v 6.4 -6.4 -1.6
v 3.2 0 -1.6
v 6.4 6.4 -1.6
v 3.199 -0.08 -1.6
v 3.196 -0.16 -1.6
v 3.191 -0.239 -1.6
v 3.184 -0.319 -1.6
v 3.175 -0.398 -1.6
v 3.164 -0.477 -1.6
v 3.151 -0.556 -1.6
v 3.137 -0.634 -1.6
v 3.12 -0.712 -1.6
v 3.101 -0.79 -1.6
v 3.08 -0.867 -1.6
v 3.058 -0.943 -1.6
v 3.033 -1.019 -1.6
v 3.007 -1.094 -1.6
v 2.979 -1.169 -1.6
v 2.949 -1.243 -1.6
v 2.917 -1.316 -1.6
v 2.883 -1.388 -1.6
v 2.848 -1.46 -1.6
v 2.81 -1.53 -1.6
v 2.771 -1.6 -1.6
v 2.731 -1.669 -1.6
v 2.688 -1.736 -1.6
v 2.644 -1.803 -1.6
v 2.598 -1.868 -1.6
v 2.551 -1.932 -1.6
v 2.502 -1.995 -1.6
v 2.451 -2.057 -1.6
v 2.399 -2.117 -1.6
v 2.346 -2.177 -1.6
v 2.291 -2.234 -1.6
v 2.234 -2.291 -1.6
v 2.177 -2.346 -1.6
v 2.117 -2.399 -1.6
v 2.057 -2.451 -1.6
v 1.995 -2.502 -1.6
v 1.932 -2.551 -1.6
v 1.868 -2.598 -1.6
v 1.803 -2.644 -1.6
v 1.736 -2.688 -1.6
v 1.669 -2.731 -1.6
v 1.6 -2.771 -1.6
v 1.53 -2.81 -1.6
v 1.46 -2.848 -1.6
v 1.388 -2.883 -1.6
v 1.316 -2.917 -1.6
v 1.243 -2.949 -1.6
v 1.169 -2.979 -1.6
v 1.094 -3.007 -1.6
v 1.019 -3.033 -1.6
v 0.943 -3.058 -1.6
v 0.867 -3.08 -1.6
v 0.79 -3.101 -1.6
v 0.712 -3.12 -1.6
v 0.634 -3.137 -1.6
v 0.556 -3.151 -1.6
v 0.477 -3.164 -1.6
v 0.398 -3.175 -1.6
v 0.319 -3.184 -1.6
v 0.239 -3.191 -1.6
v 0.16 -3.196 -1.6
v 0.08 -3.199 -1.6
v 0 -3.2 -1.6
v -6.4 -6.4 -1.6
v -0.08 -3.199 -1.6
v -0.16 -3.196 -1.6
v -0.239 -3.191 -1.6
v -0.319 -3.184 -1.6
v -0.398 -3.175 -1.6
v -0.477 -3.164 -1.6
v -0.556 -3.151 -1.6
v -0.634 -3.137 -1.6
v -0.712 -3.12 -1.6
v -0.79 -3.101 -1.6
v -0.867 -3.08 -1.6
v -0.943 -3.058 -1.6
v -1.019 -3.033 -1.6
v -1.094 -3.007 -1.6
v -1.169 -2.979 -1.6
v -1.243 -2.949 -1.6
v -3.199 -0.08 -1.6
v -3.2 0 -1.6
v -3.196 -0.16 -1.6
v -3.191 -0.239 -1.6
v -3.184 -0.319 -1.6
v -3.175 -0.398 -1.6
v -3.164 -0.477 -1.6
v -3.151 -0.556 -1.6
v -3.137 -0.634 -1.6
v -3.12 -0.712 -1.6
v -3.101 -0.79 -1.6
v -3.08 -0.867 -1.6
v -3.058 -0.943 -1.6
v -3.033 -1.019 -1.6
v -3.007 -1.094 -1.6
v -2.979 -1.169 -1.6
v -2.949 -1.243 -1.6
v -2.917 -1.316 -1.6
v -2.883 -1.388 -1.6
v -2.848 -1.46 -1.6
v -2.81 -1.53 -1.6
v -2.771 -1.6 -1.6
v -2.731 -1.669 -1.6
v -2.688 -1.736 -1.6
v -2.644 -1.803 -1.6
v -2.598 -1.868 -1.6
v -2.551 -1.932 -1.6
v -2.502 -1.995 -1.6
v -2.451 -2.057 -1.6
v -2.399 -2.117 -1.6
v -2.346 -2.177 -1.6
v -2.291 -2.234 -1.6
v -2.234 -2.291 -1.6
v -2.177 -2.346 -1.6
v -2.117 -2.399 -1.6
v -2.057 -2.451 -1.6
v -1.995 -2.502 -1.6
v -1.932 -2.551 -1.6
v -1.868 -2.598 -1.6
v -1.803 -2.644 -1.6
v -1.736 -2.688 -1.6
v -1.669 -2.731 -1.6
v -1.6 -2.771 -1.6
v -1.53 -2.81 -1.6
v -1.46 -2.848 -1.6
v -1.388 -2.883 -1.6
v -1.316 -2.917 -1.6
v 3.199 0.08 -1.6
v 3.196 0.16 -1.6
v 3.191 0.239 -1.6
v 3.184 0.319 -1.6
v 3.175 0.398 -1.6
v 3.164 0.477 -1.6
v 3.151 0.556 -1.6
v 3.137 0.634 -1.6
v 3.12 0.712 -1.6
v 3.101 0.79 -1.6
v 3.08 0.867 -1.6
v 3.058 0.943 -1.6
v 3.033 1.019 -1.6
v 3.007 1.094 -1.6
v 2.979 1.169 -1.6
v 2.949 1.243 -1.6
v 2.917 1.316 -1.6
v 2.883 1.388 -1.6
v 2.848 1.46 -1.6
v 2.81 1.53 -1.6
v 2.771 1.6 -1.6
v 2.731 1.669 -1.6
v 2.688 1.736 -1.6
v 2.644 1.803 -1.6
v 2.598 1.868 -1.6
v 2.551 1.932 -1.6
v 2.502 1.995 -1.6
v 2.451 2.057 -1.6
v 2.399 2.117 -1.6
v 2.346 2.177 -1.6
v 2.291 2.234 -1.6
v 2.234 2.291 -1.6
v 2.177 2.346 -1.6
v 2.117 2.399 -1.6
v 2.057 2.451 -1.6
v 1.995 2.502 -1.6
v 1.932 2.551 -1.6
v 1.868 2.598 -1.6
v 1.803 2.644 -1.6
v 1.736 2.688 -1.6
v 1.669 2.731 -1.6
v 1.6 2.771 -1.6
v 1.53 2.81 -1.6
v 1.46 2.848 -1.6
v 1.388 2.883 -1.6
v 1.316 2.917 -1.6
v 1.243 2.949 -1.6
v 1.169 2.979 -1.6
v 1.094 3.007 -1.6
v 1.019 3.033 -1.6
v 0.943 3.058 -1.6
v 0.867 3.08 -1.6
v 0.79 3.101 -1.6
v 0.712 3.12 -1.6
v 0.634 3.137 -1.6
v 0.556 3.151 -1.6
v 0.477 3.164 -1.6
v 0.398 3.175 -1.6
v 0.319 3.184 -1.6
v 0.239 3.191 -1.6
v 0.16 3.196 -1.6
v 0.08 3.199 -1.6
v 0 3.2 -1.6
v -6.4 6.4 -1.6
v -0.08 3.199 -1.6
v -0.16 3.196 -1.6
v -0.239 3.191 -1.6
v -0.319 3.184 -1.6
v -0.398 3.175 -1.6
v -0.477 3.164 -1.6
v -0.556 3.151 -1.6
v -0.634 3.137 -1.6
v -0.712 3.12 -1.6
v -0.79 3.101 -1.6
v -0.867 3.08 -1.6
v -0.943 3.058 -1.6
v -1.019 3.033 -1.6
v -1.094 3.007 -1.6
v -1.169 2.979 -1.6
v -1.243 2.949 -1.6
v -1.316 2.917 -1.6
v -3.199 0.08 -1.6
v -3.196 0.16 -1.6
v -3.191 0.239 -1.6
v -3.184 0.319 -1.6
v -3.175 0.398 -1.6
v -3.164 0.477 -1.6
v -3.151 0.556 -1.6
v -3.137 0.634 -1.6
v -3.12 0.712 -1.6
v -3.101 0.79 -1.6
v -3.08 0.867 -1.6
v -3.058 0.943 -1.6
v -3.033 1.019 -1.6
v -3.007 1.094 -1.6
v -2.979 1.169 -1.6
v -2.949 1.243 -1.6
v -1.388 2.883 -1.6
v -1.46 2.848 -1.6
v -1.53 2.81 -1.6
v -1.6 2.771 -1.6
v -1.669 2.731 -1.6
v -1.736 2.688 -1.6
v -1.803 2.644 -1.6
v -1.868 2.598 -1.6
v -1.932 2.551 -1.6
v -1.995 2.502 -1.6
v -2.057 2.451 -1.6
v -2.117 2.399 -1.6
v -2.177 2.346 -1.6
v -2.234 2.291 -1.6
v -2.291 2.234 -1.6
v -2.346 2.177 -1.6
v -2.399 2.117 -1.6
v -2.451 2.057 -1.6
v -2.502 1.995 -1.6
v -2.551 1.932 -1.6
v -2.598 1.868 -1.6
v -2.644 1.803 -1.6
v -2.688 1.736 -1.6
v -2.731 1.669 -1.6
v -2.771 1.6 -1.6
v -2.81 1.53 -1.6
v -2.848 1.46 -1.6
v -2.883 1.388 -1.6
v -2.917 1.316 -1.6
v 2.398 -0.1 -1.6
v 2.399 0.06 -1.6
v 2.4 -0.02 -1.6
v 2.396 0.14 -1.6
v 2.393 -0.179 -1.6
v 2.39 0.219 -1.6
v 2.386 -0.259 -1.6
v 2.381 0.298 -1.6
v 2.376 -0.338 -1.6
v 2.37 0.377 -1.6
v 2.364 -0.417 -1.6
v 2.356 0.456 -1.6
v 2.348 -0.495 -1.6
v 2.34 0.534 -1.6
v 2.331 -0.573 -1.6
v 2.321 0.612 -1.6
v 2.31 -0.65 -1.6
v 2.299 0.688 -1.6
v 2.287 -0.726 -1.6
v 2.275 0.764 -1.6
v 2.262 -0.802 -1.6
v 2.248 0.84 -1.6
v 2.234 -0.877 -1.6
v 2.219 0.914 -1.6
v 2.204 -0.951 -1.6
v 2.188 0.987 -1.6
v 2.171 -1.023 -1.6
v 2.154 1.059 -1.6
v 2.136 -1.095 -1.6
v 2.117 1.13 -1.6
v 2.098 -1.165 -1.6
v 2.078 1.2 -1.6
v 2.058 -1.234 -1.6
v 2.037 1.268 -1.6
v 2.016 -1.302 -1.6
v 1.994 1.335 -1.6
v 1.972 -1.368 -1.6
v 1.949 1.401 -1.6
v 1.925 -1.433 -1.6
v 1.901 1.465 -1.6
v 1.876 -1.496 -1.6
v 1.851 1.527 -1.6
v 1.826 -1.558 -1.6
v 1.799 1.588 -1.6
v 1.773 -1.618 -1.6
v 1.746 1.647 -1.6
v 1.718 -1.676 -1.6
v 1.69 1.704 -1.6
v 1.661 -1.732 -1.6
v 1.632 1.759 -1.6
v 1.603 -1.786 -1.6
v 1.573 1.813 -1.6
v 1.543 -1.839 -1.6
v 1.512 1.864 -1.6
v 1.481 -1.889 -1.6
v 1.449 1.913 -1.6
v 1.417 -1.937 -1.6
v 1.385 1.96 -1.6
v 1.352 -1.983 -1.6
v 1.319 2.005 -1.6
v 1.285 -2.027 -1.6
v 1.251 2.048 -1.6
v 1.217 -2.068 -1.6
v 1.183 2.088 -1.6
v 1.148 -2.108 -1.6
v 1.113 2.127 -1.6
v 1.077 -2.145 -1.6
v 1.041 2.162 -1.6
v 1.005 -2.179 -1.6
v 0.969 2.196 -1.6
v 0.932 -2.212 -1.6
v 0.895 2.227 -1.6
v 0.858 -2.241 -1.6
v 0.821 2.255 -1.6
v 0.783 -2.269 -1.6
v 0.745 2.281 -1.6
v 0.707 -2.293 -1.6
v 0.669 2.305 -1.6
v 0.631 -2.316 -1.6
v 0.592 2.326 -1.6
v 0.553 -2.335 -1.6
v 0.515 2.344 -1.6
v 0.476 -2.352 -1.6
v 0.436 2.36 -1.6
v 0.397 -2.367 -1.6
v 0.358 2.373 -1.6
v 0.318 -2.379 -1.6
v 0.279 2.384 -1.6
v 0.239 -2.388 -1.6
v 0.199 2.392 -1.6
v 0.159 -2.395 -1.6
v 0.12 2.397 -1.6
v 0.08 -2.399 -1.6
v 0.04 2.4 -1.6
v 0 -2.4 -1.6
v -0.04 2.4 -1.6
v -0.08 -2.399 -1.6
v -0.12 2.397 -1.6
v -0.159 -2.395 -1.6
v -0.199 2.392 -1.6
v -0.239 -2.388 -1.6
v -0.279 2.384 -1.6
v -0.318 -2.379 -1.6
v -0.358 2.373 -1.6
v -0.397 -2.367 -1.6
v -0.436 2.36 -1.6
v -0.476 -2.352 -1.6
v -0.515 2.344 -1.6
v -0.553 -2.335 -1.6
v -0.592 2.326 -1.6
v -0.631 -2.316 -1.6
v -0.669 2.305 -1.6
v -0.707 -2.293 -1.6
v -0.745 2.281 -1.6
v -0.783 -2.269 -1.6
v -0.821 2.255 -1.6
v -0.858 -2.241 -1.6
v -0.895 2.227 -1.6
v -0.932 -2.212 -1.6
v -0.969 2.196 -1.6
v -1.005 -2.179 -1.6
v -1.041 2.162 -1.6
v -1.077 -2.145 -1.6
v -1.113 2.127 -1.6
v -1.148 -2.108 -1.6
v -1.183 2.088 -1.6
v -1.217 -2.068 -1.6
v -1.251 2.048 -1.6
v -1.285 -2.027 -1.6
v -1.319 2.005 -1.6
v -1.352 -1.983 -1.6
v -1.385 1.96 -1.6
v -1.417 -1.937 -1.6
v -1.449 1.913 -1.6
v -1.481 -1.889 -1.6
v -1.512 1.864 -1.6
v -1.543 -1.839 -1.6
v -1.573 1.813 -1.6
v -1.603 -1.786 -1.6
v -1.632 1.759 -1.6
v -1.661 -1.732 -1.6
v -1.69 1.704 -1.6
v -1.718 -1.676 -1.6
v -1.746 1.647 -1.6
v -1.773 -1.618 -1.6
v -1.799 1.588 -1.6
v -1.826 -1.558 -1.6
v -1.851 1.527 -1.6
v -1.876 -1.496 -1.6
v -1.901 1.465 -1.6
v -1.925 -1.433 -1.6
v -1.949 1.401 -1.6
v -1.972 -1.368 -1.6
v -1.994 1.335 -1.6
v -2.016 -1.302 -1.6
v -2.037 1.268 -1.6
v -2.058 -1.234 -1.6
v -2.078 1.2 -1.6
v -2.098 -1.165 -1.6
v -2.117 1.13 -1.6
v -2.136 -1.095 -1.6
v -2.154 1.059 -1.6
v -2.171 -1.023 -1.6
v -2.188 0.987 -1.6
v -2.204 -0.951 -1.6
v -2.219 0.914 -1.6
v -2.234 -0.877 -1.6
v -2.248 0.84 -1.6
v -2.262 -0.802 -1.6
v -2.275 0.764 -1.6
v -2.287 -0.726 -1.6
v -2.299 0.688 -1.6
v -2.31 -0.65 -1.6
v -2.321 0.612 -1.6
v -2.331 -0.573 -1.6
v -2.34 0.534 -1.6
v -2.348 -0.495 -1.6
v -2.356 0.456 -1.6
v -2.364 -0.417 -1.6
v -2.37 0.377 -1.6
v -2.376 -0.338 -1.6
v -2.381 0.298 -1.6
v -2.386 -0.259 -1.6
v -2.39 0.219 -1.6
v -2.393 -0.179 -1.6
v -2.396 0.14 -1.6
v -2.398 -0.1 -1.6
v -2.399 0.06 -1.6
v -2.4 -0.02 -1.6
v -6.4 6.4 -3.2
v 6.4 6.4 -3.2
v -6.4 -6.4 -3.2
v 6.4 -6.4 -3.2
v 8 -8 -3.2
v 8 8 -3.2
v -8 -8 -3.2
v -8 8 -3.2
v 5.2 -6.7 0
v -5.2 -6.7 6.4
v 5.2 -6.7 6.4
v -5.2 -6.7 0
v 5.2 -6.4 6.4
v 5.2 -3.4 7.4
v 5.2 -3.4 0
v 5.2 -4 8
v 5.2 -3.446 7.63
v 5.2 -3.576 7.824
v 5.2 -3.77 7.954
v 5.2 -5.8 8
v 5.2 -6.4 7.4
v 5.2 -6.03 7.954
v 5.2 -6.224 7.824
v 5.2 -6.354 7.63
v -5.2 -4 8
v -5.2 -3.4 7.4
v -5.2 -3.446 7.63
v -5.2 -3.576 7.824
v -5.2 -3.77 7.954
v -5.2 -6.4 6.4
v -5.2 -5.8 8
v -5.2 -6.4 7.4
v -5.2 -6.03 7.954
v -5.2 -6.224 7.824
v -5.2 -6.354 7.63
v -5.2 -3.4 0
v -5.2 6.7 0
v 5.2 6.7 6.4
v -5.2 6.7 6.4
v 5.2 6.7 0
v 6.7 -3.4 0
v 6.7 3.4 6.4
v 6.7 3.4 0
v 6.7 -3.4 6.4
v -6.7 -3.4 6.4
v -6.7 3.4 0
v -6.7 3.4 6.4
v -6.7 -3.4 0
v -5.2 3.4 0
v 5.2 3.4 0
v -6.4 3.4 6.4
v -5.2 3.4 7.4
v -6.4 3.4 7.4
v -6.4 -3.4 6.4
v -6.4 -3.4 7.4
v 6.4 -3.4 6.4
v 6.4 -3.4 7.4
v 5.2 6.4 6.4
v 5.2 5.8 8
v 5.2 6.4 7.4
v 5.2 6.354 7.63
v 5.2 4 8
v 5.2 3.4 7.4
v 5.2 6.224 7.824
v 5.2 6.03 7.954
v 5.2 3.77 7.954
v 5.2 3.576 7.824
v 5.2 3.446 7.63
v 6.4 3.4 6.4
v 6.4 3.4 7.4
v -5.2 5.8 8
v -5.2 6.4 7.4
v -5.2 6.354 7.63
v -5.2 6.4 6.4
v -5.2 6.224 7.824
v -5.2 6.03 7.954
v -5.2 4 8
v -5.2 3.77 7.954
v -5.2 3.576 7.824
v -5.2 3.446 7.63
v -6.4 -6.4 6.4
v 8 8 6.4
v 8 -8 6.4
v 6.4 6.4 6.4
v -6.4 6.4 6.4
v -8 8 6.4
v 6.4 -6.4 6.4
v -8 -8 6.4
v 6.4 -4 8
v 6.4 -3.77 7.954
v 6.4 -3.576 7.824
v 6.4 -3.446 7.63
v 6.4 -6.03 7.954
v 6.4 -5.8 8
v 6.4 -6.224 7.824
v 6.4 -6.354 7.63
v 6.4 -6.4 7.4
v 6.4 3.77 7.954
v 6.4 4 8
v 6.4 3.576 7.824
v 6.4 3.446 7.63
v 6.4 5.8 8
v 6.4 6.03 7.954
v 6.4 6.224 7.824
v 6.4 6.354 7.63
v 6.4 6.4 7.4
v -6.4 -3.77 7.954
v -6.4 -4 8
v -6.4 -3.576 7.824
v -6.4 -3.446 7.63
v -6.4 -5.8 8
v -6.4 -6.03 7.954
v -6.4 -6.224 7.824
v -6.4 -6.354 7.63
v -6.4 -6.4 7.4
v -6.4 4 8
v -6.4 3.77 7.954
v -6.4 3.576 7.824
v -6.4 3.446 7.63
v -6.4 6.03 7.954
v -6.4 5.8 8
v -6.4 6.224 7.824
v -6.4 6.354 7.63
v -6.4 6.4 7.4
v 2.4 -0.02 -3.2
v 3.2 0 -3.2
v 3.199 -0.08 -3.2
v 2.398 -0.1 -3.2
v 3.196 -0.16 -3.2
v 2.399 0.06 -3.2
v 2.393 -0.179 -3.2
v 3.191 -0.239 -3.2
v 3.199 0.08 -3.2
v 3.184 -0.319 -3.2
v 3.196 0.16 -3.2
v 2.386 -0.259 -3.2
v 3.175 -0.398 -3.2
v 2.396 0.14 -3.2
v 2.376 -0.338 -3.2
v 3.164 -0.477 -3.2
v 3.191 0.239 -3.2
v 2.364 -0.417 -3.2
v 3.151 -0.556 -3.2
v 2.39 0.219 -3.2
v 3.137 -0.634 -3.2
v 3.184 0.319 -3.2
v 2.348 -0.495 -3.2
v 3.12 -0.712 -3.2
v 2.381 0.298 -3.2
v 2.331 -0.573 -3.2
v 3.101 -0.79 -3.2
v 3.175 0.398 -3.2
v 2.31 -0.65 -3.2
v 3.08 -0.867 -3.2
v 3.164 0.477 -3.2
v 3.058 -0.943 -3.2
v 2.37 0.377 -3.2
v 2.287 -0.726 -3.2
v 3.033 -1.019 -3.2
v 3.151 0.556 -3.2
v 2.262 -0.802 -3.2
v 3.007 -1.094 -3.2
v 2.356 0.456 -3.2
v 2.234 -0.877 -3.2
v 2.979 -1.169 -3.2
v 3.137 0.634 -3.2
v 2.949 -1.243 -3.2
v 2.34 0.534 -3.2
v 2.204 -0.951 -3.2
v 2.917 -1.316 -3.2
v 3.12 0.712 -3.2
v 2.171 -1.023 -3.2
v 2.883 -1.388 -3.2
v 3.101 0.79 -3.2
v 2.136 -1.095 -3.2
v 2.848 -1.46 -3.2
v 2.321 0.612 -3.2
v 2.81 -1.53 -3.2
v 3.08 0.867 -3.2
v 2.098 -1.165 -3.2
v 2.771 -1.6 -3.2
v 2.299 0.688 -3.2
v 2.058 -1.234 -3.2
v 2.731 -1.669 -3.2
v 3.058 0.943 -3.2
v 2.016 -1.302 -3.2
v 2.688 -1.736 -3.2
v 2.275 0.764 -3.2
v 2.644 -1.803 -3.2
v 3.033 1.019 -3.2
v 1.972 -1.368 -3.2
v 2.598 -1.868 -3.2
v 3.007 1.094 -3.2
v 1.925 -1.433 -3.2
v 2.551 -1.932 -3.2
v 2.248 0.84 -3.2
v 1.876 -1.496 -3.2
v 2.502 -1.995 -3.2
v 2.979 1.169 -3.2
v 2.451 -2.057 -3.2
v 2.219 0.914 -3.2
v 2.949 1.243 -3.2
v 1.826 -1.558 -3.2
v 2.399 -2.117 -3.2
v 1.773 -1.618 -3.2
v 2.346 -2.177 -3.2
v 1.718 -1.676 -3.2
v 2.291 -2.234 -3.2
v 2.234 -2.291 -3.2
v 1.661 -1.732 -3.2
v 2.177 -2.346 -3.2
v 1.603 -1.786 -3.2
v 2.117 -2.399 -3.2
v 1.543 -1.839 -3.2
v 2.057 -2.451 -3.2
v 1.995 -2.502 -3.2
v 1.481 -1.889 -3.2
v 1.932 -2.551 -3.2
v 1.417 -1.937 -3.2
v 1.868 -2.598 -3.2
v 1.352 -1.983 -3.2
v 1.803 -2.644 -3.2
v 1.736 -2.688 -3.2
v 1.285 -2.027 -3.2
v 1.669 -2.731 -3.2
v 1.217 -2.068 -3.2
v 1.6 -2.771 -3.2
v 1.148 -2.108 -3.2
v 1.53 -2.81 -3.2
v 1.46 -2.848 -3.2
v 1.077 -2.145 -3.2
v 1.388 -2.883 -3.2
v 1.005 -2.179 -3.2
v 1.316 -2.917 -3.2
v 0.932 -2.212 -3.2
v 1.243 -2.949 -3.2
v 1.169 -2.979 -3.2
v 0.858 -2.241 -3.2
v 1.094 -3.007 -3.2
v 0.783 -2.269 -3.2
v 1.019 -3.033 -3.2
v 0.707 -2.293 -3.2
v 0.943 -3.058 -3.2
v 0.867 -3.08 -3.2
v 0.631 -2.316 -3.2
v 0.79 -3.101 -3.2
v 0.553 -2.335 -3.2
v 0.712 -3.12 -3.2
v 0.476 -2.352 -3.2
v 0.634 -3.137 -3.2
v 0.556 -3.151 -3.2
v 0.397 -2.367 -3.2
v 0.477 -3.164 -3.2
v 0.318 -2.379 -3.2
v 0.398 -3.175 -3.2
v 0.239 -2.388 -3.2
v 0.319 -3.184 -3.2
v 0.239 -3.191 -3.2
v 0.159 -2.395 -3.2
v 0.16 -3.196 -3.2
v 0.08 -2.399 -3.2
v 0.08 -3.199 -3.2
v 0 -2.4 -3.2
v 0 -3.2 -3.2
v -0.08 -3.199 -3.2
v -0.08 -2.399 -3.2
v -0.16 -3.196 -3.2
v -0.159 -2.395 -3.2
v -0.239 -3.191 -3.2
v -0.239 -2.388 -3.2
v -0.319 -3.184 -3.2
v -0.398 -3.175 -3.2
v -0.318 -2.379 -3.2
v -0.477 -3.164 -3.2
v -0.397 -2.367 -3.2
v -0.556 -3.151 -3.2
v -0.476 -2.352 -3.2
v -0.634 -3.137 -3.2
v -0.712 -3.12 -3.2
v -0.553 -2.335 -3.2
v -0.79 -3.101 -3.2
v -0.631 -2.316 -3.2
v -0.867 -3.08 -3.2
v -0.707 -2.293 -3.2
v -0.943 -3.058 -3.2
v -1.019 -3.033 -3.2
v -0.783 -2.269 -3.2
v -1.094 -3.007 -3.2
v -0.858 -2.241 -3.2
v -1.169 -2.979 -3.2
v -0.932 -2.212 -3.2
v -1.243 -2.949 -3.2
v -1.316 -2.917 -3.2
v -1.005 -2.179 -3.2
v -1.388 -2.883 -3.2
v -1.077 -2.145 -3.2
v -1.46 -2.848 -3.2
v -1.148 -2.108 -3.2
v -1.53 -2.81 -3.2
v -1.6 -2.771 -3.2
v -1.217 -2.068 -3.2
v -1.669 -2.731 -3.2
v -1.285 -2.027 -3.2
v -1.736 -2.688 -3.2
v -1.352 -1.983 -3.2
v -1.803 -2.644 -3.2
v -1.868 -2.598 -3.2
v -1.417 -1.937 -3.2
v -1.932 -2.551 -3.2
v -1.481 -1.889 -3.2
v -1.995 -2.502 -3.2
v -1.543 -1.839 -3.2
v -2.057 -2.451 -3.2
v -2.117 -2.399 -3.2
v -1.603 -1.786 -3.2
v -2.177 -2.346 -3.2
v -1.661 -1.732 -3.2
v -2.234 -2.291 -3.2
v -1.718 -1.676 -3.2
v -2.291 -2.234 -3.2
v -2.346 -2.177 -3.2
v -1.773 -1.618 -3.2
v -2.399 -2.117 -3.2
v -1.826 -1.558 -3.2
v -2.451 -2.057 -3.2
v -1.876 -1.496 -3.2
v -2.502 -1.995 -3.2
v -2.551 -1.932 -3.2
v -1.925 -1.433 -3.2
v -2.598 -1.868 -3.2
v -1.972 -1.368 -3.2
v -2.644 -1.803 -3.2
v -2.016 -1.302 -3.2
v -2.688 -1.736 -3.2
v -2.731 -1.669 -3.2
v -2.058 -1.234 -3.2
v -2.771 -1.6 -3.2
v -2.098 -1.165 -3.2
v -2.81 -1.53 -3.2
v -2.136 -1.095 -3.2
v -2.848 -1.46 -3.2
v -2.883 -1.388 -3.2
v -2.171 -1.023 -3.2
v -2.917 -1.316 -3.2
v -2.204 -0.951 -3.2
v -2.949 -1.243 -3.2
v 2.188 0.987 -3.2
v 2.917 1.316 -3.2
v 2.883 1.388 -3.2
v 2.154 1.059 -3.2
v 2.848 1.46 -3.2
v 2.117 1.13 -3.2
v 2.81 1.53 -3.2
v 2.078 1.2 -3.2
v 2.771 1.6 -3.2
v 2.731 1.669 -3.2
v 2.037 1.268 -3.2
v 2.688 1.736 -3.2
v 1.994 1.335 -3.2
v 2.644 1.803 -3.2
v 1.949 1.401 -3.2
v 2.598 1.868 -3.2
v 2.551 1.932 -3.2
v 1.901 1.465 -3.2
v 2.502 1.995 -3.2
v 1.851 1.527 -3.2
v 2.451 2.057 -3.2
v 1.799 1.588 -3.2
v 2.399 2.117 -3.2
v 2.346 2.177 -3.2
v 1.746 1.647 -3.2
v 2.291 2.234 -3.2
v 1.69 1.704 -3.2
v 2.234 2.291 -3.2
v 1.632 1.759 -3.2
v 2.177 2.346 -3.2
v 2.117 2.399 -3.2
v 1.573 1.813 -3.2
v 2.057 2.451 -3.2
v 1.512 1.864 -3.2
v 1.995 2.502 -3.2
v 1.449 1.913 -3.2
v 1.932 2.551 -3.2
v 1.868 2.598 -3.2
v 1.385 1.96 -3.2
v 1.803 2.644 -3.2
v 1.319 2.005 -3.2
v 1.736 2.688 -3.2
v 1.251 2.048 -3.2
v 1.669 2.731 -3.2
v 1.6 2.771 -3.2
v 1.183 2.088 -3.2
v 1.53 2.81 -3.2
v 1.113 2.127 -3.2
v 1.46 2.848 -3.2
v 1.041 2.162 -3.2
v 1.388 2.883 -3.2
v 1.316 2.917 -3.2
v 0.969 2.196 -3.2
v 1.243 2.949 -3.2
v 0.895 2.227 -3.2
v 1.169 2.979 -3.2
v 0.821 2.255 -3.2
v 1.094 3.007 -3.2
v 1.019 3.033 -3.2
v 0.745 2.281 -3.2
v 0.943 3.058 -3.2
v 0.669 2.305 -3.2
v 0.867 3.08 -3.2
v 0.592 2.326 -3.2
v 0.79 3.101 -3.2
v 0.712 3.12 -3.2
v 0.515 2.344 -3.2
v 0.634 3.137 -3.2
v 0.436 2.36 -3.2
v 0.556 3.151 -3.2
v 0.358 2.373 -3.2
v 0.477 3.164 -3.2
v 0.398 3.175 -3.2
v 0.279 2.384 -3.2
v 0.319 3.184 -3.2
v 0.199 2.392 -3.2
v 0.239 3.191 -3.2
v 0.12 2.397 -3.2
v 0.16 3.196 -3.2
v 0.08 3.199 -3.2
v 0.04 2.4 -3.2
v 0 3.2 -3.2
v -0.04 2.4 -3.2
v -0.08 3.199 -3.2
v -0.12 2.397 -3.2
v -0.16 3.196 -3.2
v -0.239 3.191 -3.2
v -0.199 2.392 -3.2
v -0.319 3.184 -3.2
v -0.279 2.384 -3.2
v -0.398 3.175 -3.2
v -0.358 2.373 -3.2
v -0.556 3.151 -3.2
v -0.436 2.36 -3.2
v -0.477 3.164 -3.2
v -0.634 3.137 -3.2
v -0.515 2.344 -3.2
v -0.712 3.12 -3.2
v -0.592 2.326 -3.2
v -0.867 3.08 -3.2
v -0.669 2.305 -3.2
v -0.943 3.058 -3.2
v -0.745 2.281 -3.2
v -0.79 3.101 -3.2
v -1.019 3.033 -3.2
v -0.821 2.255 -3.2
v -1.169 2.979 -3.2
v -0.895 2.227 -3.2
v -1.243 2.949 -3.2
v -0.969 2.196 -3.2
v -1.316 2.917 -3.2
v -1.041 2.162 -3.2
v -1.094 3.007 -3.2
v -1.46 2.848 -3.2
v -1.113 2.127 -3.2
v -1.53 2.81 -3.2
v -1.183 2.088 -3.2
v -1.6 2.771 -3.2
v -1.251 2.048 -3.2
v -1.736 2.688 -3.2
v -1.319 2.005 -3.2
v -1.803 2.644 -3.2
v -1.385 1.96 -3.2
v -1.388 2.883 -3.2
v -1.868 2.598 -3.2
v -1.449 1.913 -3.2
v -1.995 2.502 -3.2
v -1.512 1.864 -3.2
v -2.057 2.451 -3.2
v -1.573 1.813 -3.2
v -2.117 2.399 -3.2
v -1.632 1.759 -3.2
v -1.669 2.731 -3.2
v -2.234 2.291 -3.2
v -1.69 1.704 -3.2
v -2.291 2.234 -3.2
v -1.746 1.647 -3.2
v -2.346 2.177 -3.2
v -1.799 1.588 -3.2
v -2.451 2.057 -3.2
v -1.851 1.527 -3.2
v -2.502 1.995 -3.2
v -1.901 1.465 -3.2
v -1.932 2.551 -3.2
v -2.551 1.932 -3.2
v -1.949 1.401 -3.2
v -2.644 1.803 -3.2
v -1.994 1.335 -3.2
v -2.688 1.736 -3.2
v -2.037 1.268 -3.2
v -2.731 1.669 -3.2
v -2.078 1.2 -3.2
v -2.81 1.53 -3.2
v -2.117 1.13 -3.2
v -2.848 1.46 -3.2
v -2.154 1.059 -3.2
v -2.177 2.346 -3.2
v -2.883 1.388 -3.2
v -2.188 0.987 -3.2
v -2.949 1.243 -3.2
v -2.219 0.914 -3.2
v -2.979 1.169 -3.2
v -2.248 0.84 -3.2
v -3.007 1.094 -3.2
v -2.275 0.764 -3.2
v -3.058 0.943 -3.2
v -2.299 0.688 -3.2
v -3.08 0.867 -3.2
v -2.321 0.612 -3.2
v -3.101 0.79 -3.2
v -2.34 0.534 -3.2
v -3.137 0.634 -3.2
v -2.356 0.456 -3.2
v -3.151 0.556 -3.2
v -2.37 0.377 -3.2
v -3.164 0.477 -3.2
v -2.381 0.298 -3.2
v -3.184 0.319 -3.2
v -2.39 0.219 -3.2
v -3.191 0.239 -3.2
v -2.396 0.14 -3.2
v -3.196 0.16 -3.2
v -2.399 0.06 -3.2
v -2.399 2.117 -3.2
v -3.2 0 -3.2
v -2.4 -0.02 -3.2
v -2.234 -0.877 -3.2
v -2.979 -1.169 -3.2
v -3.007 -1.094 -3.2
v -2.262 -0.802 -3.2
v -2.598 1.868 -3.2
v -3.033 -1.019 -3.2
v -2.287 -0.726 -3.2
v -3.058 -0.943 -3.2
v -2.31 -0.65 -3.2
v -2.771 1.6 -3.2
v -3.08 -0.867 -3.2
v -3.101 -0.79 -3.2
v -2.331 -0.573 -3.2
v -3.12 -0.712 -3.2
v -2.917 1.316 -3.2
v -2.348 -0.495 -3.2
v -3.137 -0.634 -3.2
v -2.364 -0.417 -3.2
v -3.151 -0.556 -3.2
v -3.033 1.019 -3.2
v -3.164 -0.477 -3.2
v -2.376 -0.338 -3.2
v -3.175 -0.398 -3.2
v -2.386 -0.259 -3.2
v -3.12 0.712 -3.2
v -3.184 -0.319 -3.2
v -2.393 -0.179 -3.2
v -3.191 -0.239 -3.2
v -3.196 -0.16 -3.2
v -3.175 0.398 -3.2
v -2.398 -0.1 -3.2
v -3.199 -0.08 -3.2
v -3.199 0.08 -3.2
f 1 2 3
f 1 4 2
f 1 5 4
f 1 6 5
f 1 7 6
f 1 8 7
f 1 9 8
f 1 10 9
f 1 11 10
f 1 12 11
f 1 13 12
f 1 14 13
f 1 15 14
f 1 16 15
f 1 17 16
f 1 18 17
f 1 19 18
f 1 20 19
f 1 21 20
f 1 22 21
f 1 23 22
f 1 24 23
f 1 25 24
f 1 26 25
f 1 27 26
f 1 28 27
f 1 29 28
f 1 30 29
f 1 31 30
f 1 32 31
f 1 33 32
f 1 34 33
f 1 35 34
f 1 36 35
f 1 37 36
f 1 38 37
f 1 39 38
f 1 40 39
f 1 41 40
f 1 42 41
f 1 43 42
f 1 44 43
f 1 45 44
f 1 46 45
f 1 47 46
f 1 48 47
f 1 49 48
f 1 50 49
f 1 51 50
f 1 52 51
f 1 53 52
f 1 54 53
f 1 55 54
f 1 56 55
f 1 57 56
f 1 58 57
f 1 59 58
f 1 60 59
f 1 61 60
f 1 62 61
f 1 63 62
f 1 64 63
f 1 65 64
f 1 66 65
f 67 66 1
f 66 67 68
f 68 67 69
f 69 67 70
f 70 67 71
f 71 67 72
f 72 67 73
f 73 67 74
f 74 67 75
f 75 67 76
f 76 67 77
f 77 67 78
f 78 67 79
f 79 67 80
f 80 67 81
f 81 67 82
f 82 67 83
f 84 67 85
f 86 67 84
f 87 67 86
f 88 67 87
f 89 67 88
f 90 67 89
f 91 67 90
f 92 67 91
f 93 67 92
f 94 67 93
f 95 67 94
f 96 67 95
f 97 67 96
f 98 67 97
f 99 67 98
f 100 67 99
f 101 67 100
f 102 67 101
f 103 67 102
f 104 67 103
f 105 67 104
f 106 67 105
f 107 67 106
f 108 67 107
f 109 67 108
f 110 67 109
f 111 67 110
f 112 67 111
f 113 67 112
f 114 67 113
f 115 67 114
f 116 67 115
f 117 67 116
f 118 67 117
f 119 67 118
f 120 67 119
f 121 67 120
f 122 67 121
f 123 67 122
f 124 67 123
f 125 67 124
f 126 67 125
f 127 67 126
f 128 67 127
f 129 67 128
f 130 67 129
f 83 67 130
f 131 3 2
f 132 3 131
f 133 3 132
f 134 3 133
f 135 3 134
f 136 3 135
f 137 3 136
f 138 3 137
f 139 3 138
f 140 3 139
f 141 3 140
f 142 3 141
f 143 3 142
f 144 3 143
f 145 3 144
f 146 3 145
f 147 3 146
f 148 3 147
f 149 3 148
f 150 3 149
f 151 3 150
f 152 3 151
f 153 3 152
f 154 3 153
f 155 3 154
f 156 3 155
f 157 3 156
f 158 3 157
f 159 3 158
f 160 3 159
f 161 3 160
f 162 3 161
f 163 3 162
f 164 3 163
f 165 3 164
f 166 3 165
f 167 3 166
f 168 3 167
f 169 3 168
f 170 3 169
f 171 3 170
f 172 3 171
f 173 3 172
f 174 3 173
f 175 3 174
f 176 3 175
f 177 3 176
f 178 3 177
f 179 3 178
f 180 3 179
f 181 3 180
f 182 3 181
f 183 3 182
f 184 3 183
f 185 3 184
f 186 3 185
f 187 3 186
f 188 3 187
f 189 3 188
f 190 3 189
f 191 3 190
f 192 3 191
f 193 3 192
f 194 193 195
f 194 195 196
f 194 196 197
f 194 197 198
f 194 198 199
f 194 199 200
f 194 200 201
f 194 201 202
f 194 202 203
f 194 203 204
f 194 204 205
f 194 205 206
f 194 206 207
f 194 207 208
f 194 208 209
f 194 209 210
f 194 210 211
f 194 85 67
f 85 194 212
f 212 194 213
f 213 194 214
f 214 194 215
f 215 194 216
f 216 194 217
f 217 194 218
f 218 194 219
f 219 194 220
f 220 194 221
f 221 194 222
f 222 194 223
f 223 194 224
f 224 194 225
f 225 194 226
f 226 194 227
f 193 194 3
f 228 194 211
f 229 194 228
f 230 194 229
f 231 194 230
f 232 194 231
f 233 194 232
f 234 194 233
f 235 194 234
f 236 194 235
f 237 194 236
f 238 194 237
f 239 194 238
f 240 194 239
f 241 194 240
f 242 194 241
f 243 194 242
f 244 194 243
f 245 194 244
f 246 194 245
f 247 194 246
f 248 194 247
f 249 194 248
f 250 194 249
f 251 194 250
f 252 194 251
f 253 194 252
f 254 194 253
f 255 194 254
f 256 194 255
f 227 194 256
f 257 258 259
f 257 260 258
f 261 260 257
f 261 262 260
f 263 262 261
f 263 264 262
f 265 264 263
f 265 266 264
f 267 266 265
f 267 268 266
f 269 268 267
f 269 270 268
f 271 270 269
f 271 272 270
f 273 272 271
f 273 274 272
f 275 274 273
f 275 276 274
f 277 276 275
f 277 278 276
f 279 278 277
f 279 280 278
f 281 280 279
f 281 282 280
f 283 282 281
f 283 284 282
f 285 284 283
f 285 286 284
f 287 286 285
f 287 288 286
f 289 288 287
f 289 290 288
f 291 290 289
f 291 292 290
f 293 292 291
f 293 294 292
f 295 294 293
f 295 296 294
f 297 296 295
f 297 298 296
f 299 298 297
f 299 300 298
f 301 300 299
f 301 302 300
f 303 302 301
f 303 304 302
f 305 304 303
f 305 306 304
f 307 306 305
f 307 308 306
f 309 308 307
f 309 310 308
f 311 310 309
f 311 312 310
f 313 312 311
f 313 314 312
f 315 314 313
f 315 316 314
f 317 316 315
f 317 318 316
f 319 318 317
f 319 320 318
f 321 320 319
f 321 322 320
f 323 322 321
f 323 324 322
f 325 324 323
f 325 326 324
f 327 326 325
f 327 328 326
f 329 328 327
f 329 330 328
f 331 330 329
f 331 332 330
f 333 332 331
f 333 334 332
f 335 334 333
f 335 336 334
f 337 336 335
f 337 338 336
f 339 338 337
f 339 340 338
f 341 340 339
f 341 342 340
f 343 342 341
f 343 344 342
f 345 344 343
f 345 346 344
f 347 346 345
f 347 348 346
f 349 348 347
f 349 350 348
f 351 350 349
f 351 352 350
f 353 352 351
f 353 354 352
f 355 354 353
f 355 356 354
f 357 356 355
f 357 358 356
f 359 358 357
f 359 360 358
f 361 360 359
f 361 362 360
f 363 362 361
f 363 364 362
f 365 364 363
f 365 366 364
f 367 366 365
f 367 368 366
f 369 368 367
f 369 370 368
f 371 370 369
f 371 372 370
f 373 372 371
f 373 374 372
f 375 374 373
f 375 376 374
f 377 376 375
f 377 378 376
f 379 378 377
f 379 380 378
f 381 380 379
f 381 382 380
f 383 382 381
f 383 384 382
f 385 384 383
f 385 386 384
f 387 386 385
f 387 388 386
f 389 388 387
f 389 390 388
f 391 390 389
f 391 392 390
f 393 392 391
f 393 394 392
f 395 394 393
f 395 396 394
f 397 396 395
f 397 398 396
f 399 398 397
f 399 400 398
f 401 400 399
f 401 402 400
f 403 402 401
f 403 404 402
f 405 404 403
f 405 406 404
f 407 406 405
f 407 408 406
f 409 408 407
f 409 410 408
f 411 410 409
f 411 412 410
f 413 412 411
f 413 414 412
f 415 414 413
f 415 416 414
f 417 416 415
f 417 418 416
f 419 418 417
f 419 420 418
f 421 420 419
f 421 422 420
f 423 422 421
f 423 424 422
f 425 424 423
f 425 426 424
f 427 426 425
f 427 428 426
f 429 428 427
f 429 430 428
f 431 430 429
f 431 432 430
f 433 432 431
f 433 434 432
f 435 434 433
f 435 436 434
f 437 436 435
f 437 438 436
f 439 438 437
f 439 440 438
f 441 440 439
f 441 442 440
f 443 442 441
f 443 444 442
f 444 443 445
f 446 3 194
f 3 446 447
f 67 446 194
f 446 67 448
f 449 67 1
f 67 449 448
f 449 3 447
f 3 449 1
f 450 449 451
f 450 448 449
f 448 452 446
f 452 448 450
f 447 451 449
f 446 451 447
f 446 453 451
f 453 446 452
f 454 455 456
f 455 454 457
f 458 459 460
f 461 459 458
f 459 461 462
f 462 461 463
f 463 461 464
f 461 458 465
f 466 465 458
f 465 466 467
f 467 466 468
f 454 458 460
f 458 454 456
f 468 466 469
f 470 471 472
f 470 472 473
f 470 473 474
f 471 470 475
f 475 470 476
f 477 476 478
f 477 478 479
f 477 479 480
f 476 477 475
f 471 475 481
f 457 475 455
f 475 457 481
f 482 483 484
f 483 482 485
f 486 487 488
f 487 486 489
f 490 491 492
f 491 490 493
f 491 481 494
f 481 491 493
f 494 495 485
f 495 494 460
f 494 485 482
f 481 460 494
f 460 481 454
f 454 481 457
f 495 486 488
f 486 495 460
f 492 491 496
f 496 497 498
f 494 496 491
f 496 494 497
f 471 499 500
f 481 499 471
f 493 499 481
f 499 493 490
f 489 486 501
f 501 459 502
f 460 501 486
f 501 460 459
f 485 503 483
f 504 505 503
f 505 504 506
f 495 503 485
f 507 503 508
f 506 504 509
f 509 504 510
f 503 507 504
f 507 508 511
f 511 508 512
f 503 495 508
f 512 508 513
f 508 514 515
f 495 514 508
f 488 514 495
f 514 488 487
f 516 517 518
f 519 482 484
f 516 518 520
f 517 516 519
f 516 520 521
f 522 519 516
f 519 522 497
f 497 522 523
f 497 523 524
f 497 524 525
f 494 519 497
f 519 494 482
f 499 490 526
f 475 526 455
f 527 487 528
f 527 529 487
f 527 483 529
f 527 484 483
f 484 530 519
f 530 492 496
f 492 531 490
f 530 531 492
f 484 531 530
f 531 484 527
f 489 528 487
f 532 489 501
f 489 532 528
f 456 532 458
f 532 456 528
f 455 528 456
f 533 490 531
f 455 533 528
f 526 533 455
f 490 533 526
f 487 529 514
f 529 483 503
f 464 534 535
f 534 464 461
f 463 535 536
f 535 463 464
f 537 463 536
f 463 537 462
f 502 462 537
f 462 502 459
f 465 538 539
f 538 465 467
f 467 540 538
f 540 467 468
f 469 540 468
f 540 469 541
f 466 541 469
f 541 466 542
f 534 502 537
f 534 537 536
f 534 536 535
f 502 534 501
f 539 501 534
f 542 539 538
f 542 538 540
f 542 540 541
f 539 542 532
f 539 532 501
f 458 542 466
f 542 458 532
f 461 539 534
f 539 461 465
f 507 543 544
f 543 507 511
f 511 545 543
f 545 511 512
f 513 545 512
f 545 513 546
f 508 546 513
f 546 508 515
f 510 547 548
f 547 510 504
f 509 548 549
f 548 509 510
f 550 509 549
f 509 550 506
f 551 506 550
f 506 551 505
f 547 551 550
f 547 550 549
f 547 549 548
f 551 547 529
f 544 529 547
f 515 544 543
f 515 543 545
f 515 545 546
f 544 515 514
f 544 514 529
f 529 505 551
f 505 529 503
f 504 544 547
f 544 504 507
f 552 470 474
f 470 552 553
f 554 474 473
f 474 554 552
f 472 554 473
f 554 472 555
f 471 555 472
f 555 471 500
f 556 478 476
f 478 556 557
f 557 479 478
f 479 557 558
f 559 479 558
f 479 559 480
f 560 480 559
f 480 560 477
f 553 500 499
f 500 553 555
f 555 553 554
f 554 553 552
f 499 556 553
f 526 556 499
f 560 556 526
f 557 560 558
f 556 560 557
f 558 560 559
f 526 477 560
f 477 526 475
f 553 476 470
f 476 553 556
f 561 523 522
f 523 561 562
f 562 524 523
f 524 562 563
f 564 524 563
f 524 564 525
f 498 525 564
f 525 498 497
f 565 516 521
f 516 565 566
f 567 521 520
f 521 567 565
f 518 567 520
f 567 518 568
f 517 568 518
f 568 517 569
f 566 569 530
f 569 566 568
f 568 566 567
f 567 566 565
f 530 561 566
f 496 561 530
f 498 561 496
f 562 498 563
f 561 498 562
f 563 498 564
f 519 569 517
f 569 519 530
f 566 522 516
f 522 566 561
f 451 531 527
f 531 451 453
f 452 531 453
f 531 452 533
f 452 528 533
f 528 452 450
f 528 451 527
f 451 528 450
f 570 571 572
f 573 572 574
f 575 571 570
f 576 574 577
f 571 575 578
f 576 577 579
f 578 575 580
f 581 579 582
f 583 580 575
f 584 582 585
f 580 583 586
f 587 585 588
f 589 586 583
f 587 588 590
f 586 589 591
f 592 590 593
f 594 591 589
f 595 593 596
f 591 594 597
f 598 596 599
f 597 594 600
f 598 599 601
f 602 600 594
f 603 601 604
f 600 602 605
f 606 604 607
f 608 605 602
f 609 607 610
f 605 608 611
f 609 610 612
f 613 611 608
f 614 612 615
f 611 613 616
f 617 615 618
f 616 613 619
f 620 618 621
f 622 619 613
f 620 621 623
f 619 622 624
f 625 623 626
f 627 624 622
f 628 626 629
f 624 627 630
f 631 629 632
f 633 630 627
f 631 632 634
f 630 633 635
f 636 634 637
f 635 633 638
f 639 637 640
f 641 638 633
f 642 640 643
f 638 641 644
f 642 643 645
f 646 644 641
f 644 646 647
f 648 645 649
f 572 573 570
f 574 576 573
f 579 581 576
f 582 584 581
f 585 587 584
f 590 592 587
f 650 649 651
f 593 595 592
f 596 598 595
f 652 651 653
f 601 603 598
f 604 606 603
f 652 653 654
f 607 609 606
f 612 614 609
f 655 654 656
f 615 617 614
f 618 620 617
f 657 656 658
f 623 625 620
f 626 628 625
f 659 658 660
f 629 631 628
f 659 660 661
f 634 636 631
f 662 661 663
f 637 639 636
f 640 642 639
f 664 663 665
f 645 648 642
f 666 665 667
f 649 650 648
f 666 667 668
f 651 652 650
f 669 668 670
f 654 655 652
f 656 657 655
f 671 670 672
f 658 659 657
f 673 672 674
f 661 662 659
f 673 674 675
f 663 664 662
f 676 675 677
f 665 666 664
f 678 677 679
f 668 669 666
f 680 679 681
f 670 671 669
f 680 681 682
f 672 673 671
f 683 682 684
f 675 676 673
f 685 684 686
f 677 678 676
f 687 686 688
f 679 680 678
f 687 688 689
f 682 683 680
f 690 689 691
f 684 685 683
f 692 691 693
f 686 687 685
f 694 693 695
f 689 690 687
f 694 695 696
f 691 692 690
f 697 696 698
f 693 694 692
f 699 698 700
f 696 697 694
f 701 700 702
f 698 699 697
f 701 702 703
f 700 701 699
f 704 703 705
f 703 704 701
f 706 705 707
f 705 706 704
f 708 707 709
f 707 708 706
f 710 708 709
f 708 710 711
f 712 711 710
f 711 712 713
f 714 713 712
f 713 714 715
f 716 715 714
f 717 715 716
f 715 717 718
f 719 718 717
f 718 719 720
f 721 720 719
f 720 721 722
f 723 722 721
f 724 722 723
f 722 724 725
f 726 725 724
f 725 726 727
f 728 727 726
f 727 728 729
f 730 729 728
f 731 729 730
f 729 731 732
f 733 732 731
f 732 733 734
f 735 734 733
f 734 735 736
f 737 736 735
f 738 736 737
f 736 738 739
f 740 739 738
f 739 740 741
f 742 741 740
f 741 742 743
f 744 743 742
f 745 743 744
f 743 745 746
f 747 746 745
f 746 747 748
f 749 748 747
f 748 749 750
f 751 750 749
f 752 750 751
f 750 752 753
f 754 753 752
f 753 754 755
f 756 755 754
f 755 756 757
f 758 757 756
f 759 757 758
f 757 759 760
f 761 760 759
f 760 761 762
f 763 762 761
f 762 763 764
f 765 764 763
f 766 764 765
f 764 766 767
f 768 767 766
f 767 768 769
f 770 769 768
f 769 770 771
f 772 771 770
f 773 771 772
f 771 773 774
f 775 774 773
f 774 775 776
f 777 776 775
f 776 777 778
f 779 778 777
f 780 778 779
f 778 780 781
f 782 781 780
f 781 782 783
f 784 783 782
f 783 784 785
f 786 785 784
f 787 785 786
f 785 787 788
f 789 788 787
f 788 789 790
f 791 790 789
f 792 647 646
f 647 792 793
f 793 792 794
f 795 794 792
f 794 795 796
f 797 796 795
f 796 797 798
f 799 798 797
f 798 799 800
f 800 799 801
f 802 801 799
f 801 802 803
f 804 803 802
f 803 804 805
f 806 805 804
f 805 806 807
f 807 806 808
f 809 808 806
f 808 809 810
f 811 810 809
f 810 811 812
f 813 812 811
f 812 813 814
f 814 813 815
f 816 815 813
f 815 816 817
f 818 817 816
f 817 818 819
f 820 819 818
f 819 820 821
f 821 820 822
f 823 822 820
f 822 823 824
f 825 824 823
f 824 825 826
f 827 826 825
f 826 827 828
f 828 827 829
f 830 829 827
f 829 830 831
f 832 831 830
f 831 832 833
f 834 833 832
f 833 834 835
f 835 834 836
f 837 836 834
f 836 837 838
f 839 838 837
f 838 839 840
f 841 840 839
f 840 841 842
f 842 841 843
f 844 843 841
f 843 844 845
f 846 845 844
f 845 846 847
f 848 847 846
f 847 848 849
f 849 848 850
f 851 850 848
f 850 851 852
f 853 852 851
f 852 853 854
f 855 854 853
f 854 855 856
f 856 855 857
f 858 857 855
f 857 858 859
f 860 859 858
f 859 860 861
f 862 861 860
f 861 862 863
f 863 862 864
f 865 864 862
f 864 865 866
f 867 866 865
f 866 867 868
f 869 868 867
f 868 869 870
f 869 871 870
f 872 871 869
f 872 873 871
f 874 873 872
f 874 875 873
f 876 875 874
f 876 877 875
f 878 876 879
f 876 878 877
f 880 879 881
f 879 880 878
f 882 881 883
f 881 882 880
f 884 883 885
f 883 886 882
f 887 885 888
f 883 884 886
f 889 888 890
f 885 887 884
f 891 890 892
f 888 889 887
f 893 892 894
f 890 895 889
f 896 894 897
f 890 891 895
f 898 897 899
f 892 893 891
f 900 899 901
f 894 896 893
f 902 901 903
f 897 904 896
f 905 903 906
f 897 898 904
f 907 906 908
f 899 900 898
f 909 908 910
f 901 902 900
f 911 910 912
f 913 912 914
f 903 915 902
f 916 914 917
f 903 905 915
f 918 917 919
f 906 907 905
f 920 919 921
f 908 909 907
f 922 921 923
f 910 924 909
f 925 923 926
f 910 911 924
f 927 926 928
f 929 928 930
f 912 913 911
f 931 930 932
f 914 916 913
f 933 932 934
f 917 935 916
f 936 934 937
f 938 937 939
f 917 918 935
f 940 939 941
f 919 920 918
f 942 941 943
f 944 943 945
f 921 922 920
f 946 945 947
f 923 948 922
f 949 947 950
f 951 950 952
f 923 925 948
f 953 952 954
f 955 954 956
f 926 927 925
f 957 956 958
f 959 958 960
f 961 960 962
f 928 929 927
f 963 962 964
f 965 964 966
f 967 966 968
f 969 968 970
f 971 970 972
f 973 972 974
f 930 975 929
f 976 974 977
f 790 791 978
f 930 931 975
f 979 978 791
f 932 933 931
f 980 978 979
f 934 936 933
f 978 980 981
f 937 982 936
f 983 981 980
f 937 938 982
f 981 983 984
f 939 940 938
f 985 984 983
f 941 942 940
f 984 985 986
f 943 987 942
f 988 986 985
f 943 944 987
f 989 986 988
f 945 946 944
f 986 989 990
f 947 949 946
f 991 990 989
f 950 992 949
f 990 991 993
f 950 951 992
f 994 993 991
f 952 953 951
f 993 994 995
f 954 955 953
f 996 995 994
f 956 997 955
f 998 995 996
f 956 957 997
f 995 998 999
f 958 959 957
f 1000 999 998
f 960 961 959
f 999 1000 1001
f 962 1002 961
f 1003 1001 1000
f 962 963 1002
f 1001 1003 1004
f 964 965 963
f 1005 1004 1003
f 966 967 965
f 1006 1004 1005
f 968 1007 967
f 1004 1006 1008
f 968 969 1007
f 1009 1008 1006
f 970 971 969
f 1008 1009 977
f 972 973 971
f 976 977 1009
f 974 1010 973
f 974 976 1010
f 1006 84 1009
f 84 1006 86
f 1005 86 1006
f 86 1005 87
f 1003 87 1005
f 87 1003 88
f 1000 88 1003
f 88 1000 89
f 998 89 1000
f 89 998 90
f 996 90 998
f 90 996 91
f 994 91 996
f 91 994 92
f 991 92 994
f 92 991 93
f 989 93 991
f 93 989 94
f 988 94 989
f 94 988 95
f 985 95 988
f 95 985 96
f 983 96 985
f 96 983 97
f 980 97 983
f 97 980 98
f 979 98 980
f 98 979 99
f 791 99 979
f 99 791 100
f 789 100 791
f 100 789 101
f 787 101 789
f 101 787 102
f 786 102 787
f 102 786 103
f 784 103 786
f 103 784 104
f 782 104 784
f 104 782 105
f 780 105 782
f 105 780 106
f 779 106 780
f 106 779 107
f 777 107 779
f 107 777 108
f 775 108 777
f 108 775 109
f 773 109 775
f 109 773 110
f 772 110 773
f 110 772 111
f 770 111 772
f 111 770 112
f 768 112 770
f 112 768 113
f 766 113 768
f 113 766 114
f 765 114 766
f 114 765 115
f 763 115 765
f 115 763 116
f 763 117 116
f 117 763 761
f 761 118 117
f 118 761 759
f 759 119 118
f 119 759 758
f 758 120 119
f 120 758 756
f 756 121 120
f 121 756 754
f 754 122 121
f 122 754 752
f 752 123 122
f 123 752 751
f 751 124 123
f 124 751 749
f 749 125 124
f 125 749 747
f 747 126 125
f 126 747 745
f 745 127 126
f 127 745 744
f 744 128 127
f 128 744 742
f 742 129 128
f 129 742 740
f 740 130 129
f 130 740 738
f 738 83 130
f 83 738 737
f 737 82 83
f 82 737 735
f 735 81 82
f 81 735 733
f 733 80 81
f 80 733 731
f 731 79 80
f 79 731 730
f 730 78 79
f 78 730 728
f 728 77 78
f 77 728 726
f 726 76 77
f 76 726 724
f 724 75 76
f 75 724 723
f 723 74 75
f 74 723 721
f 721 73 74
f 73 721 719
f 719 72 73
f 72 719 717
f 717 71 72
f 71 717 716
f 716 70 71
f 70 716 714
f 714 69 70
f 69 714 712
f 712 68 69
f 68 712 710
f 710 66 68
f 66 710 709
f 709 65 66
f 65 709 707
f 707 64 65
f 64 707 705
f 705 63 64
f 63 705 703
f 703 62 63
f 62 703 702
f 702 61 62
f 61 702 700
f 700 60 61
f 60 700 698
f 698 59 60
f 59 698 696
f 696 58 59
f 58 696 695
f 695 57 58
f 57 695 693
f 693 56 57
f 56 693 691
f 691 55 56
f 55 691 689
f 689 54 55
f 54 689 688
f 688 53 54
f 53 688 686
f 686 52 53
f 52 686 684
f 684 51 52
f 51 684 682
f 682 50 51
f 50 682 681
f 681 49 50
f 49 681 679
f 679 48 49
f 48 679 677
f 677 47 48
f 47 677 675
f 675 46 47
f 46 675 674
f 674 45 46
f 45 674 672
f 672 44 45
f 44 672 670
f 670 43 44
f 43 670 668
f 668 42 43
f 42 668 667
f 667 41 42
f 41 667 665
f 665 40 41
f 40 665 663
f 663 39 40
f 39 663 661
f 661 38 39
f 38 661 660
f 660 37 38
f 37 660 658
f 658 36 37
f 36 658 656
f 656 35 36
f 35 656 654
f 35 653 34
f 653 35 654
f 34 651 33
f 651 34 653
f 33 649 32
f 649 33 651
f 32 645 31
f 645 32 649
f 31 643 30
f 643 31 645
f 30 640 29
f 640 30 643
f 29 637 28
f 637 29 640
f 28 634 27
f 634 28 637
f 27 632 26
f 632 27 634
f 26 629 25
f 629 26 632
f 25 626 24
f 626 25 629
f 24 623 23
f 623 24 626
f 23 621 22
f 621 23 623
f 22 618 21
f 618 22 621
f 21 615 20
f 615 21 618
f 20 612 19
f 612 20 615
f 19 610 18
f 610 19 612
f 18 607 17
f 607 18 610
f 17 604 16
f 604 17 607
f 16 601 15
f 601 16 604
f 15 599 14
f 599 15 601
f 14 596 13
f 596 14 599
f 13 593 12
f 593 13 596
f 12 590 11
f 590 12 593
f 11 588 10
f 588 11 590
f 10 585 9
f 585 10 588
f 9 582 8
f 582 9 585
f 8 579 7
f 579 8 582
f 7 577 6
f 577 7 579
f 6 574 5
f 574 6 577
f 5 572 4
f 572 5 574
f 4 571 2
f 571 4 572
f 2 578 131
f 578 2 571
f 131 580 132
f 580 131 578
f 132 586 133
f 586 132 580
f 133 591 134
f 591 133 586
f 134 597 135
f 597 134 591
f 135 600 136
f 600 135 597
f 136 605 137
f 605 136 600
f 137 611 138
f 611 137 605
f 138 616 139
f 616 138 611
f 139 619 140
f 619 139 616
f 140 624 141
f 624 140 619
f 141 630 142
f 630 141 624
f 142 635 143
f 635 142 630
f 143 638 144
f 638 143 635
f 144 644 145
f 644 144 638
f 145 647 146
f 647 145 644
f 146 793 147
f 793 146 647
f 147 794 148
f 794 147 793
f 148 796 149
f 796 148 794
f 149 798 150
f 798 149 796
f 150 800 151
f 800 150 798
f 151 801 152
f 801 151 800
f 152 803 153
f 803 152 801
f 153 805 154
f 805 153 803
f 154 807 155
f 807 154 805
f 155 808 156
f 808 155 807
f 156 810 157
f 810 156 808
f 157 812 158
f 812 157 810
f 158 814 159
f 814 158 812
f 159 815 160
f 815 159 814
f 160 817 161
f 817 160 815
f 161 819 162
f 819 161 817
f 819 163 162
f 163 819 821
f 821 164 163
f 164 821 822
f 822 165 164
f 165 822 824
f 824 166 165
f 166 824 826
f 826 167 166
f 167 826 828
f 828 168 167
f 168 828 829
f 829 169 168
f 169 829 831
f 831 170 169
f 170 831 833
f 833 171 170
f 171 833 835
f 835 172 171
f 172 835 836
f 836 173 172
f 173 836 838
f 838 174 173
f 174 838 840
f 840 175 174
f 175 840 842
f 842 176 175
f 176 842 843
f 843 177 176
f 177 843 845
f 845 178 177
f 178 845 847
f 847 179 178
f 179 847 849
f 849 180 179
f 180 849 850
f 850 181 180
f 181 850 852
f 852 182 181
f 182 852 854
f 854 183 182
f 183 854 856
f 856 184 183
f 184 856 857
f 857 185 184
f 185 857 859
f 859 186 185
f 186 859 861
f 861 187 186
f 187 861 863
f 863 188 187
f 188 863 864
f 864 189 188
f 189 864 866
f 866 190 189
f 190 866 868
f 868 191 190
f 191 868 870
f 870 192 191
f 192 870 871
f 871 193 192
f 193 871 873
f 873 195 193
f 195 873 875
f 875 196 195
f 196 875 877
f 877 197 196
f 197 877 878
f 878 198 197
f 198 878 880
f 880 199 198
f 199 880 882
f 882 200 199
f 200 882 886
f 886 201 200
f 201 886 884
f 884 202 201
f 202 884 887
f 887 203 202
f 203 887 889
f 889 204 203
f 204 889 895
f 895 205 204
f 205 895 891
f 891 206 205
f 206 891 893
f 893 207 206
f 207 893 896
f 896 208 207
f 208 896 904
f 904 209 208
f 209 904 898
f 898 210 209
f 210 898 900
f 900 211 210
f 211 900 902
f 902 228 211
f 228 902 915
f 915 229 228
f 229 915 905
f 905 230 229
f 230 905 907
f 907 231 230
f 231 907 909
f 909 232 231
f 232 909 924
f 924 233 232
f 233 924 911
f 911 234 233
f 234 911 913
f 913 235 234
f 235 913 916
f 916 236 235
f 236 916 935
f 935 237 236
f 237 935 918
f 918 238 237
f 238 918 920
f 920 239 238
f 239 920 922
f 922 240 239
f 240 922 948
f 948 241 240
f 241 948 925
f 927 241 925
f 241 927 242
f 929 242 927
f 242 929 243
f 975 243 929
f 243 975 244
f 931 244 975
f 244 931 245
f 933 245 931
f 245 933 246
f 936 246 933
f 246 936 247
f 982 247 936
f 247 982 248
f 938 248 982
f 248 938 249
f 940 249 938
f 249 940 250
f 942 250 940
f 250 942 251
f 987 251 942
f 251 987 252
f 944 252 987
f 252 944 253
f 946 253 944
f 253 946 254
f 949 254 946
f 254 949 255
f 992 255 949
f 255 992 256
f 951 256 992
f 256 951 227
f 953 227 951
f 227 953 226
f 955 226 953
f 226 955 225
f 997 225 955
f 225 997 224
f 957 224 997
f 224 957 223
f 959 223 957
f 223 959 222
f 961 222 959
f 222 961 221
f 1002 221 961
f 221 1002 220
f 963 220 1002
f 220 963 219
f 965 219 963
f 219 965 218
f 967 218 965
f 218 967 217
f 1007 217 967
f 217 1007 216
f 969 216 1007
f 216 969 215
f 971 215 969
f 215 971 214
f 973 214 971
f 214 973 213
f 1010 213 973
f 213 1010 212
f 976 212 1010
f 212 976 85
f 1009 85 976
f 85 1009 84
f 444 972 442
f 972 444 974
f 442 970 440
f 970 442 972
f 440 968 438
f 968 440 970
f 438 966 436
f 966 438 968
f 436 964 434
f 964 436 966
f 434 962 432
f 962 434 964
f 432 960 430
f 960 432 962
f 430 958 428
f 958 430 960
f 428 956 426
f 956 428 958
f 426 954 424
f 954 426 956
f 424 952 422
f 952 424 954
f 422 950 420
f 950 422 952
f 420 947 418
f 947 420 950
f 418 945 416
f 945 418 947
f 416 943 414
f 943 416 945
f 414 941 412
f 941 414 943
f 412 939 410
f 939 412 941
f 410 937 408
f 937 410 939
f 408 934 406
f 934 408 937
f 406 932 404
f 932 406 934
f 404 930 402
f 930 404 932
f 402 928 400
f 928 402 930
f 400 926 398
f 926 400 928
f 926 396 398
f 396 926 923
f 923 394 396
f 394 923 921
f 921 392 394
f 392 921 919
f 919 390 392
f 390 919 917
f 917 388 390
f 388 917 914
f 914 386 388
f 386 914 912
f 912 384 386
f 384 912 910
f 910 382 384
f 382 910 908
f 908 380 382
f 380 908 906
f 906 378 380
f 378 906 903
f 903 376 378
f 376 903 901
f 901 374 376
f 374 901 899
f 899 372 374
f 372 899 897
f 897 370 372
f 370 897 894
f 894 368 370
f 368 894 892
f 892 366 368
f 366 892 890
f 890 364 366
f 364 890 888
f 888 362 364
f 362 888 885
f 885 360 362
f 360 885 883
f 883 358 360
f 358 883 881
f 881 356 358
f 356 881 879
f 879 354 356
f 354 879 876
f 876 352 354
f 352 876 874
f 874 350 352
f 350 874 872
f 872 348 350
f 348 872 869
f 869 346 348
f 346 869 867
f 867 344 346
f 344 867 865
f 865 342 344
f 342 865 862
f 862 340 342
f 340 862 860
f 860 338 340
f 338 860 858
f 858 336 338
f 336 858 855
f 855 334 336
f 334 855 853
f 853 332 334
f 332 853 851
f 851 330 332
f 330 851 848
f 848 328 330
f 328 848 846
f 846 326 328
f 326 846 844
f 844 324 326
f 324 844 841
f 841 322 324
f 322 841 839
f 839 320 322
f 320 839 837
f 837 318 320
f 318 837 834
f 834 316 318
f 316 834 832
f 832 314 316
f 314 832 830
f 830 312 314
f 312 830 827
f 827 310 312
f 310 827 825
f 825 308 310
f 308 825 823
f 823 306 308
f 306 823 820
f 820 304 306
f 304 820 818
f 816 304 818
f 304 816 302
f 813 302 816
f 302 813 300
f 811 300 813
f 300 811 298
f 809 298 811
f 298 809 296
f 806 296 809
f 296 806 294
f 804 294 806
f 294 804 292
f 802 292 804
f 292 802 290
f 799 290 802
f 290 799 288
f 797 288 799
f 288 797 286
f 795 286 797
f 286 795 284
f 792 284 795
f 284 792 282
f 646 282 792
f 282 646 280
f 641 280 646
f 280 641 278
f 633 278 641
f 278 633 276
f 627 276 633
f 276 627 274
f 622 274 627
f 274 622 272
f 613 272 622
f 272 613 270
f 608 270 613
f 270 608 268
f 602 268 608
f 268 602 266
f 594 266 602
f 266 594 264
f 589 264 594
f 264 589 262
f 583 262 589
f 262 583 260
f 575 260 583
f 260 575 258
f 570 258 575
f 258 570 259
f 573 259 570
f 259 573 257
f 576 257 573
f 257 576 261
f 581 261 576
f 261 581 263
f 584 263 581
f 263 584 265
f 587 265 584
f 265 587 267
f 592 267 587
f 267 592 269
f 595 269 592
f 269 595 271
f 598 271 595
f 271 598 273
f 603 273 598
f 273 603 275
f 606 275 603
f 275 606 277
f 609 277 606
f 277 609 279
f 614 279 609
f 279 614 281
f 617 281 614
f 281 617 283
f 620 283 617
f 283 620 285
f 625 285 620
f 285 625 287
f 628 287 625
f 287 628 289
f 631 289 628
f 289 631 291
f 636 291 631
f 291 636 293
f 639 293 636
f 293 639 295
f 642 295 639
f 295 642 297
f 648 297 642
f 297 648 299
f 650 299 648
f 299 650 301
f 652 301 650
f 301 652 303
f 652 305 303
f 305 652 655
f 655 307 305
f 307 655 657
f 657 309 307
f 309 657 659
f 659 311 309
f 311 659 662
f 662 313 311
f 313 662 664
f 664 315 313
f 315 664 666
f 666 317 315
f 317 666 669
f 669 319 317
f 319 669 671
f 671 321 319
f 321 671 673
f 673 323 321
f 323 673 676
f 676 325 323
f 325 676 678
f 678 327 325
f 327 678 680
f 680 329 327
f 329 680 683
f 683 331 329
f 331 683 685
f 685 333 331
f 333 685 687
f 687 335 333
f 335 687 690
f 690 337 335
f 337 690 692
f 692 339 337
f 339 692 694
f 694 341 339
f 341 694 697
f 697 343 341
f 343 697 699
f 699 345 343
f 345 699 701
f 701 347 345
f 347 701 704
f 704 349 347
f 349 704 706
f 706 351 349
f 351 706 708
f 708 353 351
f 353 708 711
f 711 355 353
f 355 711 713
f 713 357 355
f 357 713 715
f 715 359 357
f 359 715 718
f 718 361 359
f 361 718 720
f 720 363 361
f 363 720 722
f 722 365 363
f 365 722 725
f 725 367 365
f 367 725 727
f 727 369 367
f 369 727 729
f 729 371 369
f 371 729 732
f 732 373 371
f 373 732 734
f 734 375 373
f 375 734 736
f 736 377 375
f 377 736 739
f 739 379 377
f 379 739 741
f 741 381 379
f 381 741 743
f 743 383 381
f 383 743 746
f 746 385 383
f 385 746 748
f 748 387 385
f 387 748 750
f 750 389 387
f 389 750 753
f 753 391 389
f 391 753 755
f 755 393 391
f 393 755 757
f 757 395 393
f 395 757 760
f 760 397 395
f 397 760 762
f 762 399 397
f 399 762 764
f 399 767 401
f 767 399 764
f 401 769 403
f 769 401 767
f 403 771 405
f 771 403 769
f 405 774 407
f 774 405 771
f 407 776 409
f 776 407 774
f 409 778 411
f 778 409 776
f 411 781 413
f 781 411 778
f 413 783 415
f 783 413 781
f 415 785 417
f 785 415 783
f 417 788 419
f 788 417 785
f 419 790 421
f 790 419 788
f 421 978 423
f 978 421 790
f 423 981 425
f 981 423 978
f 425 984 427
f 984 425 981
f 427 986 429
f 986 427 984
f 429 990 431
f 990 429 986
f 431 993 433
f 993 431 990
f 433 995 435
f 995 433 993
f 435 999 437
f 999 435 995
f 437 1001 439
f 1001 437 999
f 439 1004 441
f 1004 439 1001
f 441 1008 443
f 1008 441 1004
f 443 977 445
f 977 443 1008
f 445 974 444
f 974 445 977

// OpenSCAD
use <../lib.scad>
use <../p/box4.scad>
use <s/35700s01.scad>
$fa=1; $fs=0.2;
function ldraw_lib__35700(realsolid=false) = [
// 0 Container  2 x  2 x  1 Crate
// 0 Name: 35700.dat
// 0 Author: Gerald Lasser [GeraldLasser]
// 0 !LDRAW_ORG Part UPDATE 2019-01
// 0 !LICENSE Licensed under CC BY 2.0 and CC BY 4.0 : see CAreadme.txt
// 
// 0 BFC CERTIFY CCW
  [0,"BFC","CERTIFY"],
  [0,"BFC","CCW"],
// 
// 0 !KEYWORDS Bin, Box, Canister, Case, Tin
// 
// 0 !HISTORY 2019-06-28 [PTadmin] Official Update 2019-01
// 
// 
// 1 16 0 0 0 1 0 0 0 1 0 0 0 1 s\35700s01.dat
  [1,16,0,0,0,1,0,0,0,1,0,0,0,1, ldraw_lib__s__35700s01(realsolid)],
// 
// 1 16 0 8 0 20 0 0 0 -24 0 0 0 20 box4.dat
  [1,16,0,8,0,20,0,0,0,-24,0,0,0,20, ldraw_lib__box4(realsolid)],
];
module ldraw_lib__35700(step=0, col=false, unit=2/5, alt=false, line=0.2, solid=!$preview)
    makepoly(ldraw_lib__35700(solid), step=step, col=col, unit=unit, alt=alt, line=line, solid=solid);
ldraw_lib__35700(line=0.2);
